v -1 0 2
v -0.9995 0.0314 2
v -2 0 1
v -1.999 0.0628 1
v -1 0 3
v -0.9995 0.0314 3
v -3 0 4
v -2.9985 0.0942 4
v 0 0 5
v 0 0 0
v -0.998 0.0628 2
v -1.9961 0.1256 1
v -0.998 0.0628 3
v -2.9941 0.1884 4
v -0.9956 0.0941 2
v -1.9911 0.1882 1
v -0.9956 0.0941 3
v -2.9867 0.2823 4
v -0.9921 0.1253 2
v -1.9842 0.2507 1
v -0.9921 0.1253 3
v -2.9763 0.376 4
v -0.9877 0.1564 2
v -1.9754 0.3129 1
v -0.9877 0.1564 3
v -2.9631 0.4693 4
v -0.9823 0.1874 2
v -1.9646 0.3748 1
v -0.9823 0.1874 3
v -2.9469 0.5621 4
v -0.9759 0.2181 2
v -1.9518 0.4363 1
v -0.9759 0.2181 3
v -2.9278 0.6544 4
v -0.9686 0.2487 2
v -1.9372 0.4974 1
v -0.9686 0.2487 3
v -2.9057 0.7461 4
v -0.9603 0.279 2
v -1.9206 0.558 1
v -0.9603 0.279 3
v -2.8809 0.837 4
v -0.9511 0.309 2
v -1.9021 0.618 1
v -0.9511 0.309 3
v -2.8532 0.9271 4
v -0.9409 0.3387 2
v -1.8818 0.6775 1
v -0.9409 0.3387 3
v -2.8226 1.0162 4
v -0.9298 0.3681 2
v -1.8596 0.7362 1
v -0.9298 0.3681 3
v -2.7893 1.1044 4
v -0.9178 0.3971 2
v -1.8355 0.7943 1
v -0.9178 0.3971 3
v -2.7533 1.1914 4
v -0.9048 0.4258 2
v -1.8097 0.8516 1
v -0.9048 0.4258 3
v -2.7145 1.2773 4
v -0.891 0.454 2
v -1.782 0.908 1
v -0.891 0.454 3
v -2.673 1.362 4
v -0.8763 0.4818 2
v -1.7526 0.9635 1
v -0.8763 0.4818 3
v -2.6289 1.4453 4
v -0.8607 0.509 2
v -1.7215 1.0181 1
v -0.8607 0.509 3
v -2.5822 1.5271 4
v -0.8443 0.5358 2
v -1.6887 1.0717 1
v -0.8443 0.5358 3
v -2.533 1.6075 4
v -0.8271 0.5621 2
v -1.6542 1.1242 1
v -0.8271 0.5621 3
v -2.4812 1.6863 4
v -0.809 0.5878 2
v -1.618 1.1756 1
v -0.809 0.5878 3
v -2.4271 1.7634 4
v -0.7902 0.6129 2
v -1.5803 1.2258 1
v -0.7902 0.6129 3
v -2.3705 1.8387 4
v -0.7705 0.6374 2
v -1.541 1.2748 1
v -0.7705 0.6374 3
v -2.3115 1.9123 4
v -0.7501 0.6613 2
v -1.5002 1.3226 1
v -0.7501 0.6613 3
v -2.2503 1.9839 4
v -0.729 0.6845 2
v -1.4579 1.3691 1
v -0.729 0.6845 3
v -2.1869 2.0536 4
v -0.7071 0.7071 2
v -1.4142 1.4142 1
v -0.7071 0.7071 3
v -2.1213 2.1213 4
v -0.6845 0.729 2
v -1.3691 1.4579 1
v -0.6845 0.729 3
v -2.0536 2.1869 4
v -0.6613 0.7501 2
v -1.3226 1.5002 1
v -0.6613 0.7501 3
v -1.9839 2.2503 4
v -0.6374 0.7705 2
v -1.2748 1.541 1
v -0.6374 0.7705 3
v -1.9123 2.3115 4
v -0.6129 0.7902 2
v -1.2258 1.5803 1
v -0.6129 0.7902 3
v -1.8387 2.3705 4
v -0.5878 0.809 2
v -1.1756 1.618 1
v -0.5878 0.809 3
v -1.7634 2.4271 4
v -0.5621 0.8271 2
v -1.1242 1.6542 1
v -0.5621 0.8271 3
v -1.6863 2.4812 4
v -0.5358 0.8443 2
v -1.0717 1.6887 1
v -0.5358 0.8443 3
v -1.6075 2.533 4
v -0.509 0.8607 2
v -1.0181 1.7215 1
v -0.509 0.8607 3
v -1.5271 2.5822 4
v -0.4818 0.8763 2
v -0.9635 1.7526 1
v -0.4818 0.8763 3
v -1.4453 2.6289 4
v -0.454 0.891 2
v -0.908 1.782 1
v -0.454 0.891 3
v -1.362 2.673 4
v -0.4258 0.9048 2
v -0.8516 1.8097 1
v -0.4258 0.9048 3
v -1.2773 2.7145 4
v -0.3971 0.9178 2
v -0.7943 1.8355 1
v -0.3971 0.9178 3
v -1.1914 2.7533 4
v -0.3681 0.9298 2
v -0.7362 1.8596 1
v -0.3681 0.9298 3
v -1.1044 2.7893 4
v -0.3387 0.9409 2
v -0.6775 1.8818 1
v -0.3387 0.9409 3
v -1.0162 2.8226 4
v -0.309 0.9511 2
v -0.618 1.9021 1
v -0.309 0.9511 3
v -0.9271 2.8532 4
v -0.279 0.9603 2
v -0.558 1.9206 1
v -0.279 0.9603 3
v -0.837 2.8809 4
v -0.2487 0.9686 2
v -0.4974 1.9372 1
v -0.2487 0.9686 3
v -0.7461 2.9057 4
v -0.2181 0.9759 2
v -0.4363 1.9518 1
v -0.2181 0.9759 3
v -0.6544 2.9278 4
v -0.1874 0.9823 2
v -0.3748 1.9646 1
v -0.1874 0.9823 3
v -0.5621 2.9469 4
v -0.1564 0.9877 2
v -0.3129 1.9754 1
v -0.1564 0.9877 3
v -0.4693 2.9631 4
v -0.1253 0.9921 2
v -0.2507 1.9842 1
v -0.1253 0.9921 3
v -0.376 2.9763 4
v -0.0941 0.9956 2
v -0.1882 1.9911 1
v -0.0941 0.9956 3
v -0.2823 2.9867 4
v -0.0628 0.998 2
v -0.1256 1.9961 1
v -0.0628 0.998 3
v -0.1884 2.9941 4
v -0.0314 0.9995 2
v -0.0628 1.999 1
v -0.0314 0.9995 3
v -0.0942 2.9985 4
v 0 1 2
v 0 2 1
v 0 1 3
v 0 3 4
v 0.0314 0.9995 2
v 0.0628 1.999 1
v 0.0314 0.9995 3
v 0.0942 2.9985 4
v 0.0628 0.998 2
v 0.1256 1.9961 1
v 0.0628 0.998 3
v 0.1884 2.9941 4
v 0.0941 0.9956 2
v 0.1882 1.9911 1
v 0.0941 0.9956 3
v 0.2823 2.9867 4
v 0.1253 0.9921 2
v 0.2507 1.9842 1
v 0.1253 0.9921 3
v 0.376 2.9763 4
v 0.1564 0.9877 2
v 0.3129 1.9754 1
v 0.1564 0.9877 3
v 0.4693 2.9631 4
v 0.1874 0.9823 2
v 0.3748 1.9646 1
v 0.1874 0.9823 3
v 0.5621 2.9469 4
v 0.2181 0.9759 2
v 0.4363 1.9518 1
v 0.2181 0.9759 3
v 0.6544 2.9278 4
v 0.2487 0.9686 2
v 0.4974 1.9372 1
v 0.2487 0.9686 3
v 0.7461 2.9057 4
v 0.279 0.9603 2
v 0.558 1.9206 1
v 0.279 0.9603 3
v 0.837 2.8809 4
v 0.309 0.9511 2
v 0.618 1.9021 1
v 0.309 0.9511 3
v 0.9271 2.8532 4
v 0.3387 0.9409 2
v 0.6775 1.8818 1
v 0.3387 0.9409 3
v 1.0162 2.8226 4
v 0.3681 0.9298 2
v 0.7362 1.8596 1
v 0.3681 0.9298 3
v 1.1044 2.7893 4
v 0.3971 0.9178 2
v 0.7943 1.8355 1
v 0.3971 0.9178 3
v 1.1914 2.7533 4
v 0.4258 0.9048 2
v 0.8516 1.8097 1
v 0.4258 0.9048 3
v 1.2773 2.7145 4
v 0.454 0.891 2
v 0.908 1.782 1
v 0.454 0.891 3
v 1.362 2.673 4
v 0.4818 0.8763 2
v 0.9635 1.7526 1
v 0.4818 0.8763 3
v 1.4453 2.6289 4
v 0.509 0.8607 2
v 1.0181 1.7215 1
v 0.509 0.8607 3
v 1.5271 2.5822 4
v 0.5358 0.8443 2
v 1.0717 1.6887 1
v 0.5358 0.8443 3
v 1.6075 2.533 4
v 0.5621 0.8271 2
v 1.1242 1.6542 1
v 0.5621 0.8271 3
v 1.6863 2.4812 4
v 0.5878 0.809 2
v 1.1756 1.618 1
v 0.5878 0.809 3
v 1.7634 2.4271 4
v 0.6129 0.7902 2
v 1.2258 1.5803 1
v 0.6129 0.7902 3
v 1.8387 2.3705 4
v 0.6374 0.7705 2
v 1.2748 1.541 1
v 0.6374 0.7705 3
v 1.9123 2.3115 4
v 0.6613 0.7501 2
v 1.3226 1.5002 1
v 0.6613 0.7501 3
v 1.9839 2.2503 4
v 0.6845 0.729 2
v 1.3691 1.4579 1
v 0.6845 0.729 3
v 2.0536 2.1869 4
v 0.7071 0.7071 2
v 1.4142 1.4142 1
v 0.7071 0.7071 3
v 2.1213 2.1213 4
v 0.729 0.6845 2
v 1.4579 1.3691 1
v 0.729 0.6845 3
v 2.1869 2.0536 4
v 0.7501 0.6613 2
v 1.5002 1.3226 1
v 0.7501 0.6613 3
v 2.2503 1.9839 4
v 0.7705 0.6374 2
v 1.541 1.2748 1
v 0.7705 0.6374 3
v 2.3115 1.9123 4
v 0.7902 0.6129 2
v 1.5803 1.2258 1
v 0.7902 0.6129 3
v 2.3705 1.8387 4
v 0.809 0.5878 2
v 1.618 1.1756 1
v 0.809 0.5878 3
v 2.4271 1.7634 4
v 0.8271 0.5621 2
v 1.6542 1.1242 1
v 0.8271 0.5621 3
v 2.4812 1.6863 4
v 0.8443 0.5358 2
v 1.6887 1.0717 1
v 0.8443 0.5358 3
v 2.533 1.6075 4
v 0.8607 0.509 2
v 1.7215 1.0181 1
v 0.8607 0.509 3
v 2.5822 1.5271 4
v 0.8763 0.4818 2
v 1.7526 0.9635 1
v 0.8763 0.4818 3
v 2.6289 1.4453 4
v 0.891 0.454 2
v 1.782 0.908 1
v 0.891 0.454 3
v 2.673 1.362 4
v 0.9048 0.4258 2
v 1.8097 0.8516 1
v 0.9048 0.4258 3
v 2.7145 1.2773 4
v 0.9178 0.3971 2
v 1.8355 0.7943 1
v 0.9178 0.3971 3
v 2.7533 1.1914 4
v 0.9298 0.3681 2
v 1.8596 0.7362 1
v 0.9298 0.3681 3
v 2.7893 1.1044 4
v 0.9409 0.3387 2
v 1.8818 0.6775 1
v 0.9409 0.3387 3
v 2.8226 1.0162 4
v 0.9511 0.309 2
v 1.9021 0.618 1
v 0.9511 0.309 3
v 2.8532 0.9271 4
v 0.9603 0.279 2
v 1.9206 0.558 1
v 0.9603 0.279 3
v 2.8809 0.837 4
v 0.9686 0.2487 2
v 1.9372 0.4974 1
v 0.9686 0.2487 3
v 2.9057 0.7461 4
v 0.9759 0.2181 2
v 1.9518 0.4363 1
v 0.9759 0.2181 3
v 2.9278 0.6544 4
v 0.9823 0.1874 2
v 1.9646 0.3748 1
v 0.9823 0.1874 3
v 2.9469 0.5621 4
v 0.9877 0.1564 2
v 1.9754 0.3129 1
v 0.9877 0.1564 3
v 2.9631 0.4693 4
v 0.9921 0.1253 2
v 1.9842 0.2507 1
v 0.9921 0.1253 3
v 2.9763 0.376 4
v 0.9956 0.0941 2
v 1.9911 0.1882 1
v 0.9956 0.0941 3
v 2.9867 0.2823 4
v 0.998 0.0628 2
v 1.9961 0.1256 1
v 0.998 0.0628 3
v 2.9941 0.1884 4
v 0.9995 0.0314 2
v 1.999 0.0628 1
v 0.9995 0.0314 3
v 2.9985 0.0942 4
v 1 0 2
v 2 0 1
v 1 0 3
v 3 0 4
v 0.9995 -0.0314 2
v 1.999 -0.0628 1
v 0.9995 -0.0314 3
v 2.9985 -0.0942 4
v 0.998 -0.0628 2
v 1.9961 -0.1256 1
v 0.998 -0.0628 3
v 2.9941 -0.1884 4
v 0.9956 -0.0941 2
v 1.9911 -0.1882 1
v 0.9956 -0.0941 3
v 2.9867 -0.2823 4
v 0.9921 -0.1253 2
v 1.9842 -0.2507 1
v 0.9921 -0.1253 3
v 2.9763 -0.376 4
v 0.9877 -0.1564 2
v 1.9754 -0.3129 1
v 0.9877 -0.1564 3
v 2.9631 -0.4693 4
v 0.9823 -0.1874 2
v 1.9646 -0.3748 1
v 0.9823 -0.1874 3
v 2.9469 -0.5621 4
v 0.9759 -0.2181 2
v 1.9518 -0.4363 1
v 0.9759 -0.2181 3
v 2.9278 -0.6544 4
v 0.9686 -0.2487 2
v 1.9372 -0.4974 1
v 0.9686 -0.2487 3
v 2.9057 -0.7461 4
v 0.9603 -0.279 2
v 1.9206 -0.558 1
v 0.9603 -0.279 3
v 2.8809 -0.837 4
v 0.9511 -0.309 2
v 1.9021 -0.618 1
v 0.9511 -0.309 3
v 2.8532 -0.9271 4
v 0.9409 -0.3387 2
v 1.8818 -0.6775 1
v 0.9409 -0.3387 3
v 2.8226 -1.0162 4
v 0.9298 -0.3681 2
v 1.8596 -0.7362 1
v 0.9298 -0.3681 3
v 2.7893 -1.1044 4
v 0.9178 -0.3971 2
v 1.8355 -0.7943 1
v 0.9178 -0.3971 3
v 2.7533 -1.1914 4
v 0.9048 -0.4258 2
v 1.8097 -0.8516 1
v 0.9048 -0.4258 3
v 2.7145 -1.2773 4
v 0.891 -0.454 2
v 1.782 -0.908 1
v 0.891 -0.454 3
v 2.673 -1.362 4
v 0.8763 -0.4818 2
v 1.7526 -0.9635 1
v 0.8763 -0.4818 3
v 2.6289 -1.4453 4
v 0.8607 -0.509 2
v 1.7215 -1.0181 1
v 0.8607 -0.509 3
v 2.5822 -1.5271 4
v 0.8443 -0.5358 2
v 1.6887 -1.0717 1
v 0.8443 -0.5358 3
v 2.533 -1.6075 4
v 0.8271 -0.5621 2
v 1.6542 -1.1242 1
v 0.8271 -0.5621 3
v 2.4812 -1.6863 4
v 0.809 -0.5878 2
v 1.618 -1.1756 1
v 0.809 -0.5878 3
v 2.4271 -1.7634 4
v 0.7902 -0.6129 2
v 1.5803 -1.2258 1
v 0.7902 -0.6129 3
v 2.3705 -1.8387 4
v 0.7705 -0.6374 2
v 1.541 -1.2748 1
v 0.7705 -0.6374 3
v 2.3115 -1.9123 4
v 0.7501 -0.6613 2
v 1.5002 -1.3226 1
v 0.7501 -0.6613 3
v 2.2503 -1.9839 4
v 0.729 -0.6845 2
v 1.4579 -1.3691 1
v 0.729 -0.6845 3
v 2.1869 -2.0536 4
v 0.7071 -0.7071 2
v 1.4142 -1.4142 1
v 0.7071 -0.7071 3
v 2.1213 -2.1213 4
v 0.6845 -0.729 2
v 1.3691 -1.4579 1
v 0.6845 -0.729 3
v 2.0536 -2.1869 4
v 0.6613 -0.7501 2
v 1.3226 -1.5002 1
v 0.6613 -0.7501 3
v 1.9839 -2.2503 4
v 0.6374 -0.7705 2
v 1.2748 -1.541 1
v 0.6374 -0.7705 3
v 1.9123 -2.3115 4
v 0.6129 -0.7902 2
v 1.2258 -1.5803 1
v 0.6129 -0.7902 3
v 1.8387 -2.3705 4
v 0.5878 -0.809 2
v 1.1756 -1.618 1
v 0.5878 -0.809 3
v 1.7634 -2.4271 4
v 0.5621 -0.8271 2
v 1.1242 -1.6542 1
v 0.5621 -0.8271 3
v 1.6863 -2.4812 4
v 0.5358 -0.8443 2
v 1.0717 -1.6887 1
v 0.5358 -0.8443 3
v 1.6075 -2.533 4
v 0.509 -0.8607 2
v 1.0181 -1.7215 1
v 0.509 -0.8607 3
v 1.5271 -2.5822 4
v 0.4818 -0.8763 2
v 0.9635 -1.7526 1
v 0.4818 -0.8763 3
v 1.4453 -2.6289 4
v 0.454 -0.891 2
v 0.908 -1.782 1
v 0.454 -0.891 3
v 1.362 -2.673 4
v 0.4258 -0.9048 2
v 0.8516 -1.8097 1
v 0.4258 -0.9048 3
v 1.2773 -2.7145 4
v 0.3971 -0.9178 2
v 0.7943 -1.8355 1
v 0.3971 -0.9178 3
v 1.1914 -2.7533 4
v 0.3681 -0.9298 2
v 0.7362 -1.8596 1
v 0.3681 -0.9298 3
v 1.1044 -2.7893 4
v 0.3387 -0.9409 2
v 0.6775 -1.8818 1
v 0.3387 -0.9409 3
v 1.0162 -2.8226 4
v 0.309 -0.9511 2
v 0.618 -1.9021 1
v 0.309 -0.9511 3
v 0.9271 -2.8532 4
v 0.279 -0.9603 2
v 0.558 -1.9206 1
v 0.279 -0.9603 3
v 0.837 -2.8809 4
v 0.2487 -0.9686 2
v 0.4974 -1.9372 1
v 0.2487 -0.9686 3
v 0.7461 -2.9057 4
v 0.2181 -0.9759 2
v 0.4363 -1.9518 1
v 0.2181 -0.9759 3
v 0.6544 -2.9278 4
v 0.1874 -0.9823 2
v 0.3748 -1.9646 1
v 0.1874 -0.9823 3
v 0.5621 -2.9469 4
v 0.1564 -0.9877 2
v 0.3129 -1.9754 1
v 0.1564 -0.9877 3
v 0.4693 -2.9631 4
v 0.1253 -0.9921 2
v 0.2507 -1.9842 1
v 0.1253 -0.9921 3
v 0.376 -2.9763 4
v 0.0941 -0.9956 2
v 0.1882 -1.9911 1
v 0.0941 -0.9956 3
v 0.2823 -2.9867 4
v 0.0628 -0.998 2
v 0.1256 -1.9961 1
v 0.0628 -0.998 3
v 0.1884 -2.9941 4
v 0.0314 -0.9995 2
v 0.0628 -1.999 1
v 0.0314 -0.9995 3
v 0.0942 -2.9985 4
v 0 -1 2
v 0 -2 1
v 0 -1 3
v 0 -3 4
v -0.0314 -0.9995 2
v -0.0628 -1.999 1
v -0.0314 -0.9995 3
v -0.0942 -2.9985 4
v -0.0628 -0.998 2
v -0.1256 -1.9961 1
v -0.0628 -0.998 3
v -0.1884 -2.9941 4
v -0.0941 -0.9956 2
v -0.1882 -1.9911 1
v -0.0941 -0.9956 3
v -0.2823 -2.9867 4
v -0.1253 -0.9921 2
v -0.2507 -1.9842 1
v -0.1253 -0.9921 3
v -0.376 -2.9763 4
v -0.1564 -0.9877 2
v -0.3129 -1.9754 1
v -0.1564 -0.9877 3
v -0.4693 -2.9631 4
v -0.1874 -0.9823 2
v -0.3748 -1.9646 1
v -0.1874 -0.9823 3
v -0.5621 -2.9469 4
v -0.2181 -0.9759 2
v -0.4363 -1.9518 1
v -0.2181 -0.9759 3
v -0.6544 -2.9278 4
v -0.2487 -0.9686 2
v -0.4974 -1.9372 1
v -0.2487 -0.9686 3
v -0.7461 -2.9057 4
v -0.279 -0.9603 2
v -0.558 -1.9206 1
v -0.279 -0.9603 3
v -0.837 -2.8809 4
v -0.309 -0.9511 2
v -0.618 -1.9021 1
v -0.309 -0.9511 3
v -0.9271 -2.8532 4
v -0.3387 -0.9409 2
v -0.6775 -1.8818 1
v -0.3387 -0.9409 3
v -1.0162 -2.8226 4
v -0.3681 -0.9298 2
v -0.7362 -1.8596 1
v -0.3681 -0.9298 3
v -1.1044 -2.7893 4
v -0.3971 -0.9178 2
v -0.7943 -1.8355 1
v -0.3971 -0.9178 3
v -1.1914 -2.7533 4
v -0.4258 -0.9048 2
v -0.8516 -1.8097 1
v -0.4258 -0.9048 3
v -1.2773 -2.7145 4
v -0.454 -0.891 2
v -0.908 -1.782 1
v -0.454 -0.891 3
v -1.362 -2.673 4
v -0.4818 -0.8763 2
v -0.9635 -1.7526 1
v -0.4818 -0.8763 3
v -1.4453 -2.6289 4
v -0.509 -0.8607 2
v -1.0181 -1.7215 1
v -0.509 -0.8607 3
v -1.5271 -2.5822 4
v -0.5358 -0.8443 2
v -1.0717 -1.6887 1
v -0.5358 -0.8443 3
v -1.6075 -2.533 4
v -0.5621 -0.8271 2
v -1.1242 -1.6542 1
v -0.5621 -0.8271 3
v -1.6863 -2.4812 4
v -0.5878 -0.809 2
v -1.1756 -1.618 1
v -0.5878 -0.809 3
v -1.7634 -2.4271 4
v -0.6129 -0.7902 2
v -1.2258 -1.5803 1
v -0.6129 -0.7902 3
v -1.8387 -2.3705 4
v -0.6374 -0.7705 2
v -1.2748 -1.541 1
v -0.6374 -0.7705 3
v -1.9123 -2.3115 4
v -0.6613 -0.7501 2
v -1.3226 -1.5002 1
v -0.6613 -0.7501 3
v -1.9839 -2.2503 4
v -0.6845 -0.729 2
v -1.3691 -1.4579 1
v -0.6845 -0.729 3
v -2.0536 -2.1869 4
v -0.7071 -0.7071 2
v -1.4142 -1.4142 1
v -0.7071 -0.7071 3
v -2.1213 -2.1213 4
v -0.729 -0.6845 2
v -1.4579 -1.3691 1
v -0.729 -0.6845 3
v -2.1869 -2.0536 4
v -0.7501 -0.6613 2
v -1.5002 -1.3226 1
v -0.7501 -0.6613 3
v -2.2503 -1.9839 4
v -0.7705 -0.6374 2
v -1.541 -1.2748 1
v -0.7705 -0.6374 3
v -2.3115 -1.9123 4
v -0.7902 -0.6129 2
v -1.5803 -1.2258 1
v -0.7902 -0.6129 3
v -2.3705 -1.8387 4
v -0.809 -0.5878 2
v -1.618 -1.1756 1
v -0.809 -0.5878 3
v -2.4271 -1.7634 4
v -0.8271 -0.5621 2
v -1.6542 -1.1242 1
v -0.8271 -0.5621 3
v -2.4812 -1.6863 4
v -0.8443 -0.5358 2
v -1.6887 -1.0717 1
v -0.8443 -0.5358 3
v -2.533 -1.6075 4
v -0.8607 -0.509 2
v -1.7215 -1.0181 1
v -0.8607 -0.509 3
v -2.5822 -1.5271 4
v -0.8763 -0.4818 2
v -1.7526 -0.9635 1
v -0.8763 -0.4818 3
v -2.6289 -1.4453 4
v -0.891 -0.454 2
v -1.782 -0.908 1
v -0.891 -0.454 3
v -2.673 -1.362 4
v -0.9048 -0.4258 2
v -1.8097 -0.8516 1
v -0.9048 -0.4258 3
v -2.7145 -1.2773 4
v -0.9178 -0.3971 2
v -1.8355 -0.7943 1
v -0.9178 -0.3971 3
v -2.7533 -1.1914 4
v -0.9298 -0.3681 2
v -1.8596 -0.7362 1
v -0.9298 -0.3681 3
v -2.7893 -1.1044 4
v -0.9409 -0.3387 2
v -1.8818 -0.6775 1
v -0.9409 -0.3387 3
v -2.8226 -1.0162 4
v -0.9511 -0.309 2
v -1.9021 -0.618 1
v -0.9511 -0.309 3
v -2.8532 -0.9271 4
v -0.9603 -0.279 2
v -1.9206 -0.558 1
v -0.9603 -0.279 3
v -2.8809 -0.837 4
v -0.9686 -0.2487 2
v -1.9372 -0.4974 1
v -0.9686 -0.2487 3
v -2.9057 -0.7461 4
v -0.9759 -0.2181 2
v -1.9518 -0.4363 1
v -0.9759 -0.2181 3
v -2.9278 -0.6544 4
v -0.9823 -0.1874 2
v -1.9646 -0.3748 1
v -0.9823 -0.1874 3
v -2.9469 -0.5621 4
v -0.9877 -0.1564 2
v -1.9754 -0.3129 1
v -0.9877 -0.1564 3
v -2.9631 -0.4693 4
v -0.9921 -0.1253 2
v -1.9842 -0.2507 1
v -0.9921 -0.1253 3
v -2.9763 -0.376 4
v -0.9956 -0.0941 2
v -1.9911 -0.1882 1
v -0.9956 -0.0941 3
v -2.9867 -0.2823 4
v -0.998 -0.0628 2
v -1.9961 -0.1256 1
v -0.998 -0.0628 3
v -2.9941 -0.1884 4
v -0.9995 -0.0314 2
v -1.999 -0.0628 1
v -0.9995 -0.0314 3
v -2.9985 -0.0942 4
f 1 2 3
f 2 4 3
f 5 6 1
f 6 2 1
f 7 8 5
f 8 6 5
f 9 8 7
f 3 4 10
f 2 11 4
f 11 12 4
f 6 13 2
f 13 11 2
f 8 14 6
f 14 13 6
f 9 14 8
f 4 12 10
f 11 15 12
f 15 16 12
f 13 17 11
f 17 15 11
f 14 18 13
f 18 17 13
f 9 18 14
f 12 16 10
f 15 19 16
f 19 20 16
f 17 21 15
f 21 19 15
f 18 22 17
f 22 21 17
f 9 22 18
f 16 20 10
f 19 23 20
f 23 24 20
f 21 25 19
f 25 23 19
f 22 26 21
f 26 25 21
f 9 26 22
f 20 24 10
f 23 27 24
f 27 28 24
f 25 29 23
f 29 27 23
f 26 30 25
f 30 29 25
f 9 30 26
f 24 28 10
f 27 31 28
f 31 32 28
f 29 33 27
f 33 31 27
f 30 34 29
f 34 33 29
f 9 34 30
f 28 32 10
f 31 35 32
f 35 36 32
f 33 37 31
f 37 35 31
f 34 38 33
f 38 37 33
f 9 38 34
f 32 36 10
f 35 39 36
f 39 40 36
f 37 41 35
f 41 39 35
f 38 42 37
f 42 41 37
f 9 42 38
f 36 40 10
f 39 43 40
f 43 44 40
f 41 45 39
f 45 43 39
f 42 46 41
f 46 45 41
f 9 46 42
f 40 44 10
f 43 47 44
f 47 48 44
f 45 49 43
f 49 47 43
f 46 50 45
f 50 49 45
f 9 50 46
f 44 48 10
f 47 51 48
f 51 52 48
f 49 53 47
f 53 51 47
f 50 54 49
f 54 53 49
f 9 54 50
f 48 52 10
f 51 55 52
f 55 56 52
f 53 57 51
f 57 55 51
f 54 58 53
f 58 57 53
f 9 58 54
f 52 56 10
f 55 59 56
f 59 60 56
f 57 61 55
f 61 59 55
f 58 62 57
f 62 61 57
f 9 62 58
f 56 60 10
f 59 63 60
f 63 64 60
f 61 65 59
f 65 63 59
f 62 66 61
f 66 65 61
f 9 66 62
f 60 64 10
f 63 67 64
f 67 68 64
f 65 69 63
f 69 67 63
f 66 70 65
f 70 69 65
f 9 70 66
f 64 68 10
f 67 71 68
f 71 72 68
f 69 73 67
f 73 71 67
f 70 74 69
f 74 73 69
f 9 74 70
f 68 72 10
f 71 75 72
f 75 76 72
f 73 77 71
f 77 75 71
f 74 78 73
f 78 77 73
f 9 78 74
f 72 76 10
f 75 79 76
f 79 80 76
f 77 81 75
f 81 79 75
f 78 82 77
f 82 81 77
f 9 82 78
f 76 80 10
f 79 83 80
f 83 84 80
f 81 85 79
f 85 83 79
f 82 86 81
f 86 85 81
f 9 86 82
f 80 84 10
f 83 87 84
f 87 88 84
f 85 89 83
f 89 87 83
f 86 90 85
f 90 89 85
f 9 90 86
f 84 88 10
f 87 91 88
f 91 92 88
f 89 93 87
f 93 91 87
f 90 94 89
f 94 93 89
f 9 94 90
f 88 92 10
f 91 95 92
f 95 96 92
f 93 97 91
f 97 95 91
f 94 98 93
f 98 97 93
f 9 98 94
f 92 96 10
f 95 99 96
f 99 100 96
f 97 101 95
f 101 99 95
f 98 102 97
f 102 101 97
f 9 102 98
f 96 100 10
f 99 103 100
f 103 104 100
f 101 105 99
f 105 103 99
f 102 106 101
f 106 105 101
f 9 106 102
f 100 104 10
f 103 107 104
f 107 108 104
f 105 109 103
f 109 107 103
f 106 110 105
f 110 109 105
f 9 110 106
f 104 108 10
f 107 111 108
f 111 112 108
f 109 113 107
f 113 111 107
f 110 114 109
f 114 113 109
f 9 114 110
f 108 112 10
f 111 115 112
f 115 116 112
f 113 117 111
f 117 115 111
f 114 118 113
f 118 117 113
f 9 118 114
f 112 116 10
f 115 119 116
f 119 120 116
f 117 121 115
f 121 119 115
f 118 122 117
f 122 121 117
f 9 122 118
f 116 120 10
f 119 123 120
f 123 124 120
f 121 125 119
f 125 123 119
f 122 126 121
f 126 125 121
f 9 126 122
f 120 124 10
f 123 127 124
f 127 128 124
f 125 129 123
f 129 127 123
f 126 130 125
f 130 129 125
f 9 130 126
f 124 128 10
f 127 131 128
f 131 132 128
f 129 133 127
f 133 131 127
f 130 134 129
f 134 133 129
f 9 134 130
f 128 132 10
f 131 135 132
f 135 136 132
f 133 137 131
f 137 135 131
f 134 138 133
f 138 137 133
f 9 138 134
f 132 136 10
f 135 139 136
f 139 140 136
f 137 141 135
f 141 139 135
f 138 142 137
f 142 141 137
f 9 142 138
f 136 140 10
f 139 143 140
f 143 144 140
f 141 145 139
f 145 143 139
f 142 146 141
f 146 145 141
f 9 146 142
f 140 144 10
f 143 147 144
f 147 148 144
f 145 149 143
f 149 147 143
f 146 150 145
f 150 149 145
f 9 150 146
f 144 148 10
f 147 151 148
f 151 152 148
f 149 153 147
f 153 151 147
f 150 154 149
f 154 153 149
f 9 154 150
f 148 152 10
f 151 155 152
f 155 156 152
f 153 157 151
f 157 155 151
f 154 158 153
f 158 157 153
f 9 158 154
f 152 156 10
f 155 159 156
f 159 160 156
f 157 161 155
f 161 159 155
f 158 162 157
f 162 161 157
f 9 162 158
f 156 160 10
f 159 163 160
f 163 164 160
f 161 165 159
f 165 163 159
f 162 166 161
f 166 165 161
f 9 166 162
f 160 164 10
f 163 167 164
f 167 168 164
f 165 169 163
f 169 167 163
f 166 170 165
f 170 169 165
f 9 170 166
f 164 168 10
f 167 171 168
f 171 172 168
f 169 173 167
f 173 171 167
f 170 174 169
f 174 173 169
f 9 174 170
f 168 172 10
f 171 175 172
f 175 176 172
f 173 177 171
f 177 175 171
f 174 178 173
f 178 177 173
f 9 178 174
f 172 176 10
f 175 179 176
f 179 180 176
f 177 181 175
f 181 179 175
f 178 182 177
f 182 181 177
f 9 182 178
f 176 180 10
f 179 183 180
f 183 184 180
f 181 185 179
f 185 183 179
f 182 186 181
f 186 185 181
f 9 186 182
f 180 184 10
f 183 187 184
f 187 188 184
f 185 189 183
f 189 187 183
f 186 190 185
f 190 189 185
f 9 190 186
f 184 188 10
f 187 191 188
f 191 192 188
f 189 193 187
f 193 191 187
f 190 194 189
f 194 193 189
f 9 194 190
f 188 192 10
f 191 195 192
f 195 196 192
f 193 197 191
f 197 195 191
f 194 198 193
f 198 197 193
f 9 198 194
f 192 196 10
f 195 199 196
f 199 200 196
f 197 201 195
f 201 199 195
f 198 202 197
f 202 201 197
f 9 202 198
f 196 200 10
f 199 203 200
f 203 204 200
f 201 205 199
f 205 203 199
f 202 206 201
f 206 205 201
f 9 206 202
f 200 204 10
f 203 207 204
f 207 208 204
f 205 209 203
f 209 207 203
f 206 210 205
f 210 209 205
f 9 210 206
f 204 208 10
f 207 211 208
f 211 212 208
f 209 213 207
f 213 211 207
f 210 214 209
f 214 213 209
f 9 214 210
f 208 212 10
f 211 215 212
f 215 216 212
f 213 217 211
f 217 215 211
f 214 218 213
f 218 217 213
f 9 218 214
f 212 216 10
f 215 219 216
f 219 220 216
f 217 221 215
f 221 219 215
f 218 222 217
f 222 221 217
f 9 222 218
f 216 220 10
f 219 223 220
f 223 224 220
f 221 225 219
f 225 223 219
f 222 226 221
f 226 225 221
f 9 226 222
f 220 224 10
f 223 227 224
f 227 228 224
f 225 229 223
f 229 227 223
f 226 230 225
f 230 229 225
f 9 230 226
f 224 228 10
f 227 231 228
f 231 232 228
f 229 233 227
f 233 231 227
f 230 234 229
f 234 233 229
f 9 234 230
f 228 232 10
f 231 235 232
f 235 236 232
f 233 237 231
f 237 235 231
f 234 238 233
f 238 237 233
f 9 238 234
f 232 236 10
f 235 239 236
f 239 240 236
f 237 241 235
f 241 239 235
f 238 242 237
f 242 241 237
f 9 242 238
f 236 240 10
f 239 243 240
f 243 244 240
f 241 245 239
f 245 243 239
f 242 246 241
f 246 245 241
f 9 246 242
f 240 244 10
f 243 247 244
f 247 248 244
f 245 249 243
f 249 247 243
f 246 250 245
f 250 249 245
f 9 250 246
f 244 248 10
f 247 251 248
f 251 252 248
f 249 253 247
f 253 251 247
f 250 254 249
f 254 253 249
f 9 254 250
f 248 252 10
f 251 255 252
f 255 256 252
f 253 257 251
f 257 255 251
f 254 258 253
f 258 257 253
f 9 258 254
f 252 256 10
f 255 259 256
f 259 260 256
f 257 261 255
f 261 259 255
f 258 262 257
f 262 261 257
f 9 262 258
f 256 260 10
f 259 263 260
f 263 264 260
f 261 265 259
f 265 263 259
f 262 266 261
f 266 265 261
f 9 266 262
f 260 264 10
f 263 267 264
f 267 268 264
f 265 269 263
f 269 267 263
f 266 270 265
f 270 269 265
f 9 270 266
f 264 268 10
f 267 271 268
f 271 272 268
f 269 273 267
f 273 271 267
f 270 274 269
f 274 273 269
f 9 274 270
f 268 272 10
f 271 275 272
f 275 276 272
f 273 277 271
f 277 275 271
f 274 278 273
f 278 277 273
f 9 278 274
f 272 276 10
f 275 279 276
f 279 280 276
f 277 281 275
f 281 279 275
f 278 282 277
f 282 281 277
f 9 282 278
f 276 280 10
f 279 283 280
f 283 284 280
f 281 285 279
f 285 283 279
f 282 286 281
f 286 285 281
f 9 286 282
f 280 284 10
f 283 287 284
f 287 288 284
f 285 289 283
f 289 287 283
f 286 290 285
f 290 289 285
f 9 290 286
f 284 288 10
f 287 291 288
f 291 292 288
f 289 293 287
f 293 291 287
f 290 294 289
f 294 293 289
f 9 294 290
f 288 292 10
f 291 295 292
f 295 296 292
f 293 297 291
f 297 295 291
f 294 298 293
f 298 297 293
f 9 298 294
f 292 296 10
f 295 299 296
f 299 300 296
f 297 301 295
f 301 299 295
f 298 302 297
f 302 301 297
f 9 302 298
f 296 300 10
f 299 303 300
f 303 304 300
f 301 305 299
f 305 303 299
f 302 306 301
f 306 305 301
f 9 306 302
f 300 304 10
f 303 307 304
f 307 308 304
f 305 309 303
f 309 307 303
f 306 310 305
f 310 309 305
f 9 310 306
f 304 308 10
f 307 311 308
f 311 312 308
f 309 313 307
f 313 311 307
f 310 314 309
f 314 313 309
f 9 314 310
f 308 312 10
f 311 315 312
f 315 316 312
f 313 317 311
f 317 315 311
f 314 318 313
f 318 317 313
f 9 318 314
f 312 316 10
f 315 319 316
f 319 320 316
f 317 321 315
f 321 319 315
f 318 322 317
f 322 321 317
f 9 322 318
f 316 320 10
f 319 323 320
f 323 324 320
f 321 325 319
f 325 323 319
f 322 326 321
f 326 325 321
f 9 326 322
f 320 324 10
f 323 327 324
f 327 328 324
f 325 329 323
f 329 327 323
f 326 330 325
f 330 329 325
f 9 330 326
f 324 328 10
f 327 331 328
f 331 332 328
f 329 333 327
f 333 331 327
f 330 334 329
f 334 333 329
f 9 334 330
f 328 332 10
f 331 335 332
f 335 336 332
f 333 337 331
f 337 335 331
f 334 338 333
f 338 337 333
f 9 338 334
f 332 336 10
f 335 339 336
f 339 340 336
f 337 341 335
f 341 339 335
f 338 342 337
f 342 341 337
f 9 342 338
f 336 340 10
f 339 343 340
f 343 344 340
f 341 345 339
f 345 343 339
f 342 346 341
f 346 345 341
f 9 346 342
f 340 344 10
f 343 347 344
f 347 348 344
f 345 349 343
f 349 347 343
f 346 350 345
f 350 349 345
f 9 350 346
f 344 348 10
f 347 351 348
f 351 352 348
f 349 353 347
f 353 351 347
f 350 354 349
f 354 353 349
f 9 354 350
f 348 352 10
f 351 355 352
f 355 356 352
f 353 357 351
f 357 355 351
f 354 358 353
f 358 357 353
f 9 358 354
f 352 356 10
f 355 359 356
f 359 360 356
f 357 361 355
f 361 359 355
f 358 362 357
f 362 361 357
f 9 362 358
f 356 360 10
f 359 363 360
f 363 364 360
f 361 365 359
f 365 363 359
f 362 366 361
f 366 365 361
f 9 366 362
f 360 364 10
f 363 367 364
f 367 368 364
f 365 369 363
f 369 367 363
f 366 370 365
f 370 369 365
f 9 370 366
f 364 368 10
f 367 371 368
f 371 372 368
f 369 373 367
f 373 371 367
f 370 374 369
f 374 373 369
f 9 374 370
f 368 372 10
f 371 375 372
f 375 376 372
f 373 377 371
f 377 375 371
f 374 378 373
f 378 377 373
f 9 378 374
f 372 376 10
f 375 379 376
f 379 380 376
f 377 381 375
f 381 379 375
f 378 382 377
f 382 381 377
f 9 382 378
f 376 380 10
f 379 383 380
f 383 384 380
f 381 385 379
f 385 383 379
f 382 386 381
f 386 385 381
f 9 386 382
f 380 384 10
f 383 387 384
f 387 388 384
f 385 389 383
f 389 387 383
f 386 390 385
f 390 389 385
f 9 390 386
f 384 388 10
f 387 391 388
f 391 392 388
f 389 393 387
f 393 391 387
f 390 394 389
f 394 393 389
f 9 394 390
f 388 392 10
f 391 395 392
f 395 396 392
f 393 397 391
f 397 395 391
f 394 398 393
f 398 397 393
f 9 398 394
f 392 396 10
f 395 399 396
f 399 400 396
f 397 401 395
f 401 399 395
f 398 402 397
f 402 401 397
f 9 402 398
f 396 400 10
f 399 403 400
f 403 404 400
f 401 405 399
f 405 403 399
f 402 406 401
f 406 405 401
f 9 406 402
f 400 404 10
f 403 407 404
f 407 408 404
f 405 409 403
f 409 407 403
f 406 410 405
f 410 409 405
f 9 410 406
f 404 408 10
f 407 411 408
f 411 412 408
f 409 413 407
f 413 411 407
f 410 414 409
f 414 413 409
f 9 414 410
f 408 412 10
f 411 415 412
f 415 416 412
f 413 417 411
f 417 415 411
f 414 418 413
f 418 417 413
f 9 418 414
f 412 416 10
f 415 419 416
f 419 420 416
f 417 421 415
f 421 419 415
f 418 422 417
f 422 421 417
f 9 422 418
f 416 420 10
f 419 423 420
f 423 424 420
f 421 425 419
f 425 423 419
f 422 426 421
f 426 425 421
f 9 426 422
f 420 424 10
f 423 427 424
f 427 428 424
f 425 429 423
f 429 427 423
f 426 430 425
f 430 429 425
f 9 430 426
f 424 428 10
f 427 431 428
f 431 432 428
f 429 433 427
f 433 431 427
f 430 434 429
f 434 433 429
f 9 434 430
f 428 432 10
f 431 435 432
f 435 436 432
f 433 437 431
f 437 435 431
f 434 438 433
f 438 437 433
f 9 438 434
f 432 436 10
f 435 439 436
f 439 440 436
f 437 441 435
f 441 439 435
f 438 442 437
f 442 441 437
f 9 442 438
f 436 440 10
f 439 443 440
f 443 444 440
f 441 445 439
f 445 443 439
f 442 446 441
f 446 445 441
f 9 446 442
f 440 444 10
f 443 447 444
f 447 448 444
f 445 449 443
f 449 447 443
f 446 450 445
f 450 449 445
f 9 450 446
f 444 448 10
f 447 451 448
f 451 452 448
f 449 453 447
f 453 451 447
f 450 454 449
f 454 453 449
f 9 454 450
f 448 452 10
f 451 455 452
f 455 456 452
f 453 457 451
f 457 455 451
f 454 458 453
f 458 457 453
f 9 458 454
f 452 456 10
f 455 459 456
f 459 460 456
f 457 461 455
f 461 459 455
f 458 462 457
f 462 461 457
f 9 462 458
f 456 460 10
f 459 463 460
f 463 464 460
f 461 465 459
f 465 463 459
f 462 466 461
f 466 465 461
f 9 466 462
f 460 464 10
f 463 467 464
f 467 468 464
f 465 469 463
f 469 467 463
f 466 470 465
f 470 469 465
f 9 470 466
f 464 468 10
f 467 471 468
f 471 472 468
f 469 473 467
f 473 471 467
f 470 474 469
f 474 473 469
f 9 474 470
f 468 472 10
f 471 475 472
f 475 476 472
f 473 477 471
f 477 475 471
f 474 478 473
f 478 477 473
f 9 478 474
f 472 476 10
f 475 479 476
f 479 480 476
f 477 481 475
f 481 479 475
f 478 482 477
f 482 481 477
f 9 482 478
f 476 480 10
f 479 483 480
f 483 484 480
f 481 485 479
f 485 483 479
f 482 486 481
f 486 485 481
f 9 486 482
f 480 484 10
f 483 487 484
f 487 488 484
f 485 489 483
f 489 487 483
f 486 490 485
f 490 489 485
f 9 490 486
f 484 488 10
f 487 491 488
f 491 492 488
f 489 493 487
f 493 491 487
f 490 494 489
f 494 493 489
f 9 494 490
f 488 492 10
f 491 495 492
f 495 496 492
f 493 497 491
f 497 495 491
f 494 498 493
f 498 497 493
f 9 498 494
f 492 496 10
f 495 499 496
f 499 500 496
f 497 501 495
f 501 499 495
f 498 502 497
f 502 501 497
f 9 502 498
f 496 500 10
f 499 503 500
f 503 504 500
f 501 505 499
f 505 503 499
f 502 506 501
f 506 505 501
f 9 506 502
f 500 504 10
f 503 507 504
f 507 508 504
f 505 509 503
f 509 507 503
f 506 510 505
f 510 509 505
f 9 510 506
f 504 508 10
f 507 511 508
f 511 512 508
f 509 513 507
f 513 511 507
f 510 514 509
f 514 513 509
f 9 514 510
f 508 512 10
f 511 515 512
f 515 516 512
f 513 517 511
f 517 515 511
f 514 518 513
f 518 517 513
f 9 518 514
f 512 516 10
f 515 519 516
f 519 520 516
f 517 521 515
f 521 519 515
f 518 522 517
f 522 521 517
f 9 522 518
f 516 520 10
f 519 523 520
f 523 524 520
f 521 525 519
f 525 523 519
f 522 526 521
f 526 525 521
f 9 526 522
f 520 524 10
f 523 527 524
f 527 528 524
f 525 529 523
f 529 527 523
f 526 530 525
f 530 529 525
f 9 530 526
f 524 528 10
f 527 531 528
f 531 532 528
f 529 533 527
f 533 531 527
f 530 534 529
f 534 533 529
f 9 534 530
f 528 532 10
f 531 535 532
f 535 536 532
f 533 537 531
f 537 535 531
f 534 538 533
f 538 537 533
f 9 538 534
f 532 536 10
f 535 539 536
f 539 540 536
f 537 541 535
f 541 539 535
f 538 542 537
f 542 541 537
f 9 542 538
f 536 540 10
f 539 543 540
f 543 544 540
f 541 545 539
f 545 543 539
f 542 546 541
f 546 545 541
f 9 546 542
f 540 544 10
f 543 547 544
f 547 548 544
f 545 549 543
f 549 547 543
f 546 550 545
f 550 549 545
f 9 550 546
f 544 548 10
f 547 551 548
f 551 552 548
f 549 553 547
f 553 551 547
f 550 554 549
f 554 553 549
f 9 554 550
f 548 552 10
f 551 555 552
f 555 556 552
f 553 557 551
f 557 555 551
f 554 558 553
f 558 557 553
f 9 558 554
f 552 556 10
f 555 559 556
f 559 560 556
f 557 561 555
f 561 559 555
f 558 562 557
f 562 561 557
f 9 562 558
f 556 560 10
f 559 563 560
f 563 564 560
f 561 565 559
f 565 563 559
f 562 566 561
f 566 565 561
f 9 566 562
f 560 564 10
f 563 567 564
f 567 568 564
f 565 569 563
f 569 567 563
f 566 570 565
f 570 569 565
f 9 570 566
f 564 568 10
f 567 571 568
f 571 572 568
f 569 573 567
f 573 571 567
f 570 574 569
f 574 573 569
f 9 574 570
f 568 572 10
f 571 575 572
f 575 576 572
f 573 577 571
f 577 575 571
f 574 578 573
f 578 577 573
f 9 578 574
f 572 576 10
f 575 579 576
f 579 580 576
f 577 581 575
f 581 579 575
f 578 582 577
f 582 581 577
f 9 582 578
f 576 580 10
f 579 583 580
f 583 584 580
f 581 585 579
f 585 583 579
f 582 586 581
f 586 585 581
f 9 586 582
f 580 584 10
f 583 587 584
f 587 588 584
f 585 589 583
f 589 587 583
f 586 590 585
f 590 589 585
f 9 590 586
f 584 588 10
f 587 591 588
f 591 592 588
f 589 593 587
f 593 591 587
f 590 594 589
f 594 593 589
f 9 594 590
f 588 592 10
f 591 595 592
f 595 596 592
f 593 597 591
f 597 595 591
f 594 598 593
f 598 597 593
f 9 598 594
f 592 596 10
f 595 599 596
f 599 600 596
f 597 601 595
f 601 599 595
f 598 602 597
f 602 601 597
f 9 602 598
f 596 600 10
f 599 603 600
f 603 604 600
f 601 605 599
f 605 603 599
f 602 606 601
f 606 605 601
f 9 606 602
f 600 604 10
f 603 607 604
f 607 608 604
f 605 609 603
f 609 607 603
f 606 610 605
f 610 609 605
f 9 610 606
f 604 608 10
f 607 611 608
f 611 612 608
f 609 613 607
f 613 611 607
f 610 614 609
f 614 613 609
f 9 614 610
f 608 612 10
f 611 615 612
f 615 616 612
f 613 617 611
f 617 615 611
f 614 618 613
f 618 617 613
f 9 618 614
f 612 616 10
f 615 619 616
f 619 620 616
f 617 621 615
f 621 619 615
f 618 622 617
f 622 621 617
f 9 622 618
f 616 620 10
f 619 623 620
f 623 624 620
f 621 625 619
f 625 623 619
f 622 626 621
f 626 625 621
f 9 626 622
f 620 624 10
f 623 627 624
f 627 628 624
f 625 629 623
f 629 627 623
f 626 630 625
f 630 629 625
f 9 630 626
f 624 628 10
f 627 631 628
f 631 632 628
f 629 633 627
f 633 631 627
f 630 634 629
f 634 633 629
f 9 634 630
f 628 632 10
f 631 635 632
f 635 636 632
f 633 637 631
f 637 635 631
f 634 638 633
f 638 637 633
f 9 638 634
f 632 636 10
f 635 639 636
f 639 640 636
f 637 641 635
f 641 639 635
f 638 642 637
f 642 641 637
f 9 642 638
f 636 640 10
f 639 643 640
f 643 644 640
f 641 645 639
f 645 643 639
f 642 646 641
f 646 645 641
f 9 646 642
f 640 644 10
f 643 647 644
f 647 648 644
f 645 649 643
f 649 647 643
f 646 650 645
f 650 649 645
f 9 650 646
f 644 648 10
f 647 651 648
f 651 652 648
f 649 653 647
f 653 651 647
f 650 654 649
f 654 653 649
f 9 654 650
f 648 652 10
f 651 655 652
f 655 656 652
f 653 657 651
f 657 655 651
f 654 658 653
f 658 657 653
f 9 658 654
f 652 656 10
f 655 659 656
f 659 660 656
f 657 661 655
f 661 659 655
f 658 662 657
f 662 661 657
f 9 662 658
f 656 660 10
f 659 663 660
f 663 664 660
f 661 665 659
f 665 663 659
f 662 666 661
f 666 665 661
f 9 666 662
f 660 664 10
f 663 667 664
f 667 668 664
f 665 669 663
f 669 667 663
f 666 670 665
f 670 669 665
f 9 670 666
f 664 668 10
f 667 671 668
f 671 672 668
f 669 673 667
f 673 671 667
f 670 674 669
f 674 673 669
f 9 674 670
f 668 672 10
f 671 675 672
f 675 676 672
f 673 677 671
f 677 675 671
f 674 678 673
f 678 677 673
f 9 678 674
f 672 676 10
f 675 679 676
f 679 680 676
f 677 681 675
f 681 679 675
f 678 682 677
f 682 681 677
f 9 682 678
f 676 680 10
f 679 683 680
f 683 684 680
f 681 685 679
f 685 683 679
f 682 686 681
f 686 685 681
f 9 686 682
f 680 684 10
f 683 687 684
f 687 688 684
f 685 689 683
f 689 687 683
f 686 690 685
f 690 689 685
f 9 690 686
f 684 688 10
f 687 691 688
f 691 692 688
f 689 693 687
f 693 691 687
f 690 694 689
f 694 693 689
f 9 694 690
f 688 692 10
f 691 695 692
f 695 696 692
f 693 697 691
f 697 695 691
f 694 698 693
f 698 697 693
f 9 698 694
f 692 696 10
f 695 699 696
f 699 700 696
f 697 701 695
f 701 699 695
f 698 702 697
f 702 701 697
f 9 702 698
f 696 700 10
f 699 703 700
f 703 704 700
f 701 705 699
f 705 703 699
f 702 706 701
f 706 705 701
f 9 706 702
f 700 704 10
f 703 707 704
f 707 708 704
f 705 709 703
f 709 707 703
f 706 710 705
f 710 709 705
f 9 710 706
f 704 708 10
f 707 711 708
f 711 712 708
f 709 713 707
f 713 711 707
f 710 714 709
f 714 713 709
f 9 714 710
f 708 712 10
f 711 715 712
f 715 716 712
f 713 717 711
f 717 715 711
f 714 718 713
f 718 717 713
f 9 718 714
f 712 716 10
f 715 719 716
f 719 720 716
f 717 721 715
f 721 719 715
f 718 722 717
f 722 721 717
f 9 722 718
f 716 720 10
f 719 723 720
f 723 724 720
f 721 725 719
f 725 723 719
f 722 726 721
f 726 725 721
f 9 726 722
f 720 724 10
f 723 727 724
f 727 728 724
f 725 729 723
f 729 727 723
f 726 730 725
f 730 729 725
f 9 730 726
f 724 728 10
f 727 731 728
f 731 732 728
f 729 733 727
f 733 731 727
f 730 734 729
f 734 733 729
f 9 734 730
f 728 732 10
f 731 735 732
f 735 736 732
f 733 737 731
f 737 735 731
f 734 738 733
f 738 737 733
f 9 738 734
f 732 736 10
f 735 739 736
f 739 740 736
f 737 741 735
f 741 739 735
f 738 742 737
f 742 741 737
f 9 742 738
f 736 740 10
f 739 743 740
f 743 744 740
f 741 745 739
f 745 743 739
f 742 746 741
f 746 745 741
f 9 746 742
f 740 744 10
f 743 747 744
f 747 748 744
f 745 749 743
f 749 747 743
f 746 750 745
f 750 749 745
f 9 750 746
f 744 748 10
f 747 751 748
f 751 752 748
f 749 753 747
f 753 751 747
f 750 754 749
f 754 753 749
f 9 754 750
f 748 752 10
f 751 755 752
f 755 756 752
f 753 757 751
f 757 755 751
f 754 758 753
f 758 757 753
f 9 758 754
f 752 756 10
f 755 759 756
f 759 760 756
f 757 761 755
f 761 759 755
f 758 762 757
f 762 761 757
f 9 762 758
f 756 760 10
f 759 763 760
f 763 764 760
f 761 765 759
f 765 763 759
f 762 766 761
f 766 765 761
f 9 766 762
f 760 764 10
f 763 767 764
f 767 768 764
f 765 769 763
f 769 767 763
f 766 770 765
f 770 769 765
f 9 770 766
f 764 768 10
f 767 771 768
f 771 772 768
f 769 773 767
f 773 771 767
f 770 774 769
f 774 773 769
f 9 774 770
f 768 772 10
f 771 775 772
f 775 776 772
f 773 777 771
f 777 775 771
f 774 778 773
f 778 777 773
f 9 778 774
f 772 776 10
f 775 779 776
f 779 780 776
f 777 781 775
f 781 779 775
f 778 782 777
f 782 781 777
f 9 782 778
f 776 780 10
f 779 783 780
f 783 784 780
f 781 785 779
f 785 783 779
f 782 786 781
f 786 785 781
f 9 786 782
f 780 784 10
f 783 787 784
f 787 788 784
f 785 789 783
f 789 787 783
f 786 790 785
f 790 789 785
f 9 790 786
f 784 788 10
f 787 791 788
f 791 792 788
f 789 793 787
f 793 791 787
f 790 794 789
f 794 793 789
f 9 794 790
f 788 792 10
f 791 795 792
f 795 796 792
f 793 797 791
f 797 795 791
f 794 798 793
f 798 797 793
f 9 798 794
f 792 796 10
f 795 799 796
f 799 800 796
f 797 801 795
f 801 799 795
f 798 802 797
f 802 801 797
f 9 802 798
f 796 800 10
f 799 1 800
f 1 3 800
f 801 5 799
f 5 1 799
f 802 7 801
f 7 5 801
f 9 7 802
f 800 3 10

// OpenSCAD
rotate_extrude(angle=-360, convexity=10, $fn=200)
polygon(points=[[0,0],[2,1],[1,2],[1,3],[3,4],[0,5]]);
